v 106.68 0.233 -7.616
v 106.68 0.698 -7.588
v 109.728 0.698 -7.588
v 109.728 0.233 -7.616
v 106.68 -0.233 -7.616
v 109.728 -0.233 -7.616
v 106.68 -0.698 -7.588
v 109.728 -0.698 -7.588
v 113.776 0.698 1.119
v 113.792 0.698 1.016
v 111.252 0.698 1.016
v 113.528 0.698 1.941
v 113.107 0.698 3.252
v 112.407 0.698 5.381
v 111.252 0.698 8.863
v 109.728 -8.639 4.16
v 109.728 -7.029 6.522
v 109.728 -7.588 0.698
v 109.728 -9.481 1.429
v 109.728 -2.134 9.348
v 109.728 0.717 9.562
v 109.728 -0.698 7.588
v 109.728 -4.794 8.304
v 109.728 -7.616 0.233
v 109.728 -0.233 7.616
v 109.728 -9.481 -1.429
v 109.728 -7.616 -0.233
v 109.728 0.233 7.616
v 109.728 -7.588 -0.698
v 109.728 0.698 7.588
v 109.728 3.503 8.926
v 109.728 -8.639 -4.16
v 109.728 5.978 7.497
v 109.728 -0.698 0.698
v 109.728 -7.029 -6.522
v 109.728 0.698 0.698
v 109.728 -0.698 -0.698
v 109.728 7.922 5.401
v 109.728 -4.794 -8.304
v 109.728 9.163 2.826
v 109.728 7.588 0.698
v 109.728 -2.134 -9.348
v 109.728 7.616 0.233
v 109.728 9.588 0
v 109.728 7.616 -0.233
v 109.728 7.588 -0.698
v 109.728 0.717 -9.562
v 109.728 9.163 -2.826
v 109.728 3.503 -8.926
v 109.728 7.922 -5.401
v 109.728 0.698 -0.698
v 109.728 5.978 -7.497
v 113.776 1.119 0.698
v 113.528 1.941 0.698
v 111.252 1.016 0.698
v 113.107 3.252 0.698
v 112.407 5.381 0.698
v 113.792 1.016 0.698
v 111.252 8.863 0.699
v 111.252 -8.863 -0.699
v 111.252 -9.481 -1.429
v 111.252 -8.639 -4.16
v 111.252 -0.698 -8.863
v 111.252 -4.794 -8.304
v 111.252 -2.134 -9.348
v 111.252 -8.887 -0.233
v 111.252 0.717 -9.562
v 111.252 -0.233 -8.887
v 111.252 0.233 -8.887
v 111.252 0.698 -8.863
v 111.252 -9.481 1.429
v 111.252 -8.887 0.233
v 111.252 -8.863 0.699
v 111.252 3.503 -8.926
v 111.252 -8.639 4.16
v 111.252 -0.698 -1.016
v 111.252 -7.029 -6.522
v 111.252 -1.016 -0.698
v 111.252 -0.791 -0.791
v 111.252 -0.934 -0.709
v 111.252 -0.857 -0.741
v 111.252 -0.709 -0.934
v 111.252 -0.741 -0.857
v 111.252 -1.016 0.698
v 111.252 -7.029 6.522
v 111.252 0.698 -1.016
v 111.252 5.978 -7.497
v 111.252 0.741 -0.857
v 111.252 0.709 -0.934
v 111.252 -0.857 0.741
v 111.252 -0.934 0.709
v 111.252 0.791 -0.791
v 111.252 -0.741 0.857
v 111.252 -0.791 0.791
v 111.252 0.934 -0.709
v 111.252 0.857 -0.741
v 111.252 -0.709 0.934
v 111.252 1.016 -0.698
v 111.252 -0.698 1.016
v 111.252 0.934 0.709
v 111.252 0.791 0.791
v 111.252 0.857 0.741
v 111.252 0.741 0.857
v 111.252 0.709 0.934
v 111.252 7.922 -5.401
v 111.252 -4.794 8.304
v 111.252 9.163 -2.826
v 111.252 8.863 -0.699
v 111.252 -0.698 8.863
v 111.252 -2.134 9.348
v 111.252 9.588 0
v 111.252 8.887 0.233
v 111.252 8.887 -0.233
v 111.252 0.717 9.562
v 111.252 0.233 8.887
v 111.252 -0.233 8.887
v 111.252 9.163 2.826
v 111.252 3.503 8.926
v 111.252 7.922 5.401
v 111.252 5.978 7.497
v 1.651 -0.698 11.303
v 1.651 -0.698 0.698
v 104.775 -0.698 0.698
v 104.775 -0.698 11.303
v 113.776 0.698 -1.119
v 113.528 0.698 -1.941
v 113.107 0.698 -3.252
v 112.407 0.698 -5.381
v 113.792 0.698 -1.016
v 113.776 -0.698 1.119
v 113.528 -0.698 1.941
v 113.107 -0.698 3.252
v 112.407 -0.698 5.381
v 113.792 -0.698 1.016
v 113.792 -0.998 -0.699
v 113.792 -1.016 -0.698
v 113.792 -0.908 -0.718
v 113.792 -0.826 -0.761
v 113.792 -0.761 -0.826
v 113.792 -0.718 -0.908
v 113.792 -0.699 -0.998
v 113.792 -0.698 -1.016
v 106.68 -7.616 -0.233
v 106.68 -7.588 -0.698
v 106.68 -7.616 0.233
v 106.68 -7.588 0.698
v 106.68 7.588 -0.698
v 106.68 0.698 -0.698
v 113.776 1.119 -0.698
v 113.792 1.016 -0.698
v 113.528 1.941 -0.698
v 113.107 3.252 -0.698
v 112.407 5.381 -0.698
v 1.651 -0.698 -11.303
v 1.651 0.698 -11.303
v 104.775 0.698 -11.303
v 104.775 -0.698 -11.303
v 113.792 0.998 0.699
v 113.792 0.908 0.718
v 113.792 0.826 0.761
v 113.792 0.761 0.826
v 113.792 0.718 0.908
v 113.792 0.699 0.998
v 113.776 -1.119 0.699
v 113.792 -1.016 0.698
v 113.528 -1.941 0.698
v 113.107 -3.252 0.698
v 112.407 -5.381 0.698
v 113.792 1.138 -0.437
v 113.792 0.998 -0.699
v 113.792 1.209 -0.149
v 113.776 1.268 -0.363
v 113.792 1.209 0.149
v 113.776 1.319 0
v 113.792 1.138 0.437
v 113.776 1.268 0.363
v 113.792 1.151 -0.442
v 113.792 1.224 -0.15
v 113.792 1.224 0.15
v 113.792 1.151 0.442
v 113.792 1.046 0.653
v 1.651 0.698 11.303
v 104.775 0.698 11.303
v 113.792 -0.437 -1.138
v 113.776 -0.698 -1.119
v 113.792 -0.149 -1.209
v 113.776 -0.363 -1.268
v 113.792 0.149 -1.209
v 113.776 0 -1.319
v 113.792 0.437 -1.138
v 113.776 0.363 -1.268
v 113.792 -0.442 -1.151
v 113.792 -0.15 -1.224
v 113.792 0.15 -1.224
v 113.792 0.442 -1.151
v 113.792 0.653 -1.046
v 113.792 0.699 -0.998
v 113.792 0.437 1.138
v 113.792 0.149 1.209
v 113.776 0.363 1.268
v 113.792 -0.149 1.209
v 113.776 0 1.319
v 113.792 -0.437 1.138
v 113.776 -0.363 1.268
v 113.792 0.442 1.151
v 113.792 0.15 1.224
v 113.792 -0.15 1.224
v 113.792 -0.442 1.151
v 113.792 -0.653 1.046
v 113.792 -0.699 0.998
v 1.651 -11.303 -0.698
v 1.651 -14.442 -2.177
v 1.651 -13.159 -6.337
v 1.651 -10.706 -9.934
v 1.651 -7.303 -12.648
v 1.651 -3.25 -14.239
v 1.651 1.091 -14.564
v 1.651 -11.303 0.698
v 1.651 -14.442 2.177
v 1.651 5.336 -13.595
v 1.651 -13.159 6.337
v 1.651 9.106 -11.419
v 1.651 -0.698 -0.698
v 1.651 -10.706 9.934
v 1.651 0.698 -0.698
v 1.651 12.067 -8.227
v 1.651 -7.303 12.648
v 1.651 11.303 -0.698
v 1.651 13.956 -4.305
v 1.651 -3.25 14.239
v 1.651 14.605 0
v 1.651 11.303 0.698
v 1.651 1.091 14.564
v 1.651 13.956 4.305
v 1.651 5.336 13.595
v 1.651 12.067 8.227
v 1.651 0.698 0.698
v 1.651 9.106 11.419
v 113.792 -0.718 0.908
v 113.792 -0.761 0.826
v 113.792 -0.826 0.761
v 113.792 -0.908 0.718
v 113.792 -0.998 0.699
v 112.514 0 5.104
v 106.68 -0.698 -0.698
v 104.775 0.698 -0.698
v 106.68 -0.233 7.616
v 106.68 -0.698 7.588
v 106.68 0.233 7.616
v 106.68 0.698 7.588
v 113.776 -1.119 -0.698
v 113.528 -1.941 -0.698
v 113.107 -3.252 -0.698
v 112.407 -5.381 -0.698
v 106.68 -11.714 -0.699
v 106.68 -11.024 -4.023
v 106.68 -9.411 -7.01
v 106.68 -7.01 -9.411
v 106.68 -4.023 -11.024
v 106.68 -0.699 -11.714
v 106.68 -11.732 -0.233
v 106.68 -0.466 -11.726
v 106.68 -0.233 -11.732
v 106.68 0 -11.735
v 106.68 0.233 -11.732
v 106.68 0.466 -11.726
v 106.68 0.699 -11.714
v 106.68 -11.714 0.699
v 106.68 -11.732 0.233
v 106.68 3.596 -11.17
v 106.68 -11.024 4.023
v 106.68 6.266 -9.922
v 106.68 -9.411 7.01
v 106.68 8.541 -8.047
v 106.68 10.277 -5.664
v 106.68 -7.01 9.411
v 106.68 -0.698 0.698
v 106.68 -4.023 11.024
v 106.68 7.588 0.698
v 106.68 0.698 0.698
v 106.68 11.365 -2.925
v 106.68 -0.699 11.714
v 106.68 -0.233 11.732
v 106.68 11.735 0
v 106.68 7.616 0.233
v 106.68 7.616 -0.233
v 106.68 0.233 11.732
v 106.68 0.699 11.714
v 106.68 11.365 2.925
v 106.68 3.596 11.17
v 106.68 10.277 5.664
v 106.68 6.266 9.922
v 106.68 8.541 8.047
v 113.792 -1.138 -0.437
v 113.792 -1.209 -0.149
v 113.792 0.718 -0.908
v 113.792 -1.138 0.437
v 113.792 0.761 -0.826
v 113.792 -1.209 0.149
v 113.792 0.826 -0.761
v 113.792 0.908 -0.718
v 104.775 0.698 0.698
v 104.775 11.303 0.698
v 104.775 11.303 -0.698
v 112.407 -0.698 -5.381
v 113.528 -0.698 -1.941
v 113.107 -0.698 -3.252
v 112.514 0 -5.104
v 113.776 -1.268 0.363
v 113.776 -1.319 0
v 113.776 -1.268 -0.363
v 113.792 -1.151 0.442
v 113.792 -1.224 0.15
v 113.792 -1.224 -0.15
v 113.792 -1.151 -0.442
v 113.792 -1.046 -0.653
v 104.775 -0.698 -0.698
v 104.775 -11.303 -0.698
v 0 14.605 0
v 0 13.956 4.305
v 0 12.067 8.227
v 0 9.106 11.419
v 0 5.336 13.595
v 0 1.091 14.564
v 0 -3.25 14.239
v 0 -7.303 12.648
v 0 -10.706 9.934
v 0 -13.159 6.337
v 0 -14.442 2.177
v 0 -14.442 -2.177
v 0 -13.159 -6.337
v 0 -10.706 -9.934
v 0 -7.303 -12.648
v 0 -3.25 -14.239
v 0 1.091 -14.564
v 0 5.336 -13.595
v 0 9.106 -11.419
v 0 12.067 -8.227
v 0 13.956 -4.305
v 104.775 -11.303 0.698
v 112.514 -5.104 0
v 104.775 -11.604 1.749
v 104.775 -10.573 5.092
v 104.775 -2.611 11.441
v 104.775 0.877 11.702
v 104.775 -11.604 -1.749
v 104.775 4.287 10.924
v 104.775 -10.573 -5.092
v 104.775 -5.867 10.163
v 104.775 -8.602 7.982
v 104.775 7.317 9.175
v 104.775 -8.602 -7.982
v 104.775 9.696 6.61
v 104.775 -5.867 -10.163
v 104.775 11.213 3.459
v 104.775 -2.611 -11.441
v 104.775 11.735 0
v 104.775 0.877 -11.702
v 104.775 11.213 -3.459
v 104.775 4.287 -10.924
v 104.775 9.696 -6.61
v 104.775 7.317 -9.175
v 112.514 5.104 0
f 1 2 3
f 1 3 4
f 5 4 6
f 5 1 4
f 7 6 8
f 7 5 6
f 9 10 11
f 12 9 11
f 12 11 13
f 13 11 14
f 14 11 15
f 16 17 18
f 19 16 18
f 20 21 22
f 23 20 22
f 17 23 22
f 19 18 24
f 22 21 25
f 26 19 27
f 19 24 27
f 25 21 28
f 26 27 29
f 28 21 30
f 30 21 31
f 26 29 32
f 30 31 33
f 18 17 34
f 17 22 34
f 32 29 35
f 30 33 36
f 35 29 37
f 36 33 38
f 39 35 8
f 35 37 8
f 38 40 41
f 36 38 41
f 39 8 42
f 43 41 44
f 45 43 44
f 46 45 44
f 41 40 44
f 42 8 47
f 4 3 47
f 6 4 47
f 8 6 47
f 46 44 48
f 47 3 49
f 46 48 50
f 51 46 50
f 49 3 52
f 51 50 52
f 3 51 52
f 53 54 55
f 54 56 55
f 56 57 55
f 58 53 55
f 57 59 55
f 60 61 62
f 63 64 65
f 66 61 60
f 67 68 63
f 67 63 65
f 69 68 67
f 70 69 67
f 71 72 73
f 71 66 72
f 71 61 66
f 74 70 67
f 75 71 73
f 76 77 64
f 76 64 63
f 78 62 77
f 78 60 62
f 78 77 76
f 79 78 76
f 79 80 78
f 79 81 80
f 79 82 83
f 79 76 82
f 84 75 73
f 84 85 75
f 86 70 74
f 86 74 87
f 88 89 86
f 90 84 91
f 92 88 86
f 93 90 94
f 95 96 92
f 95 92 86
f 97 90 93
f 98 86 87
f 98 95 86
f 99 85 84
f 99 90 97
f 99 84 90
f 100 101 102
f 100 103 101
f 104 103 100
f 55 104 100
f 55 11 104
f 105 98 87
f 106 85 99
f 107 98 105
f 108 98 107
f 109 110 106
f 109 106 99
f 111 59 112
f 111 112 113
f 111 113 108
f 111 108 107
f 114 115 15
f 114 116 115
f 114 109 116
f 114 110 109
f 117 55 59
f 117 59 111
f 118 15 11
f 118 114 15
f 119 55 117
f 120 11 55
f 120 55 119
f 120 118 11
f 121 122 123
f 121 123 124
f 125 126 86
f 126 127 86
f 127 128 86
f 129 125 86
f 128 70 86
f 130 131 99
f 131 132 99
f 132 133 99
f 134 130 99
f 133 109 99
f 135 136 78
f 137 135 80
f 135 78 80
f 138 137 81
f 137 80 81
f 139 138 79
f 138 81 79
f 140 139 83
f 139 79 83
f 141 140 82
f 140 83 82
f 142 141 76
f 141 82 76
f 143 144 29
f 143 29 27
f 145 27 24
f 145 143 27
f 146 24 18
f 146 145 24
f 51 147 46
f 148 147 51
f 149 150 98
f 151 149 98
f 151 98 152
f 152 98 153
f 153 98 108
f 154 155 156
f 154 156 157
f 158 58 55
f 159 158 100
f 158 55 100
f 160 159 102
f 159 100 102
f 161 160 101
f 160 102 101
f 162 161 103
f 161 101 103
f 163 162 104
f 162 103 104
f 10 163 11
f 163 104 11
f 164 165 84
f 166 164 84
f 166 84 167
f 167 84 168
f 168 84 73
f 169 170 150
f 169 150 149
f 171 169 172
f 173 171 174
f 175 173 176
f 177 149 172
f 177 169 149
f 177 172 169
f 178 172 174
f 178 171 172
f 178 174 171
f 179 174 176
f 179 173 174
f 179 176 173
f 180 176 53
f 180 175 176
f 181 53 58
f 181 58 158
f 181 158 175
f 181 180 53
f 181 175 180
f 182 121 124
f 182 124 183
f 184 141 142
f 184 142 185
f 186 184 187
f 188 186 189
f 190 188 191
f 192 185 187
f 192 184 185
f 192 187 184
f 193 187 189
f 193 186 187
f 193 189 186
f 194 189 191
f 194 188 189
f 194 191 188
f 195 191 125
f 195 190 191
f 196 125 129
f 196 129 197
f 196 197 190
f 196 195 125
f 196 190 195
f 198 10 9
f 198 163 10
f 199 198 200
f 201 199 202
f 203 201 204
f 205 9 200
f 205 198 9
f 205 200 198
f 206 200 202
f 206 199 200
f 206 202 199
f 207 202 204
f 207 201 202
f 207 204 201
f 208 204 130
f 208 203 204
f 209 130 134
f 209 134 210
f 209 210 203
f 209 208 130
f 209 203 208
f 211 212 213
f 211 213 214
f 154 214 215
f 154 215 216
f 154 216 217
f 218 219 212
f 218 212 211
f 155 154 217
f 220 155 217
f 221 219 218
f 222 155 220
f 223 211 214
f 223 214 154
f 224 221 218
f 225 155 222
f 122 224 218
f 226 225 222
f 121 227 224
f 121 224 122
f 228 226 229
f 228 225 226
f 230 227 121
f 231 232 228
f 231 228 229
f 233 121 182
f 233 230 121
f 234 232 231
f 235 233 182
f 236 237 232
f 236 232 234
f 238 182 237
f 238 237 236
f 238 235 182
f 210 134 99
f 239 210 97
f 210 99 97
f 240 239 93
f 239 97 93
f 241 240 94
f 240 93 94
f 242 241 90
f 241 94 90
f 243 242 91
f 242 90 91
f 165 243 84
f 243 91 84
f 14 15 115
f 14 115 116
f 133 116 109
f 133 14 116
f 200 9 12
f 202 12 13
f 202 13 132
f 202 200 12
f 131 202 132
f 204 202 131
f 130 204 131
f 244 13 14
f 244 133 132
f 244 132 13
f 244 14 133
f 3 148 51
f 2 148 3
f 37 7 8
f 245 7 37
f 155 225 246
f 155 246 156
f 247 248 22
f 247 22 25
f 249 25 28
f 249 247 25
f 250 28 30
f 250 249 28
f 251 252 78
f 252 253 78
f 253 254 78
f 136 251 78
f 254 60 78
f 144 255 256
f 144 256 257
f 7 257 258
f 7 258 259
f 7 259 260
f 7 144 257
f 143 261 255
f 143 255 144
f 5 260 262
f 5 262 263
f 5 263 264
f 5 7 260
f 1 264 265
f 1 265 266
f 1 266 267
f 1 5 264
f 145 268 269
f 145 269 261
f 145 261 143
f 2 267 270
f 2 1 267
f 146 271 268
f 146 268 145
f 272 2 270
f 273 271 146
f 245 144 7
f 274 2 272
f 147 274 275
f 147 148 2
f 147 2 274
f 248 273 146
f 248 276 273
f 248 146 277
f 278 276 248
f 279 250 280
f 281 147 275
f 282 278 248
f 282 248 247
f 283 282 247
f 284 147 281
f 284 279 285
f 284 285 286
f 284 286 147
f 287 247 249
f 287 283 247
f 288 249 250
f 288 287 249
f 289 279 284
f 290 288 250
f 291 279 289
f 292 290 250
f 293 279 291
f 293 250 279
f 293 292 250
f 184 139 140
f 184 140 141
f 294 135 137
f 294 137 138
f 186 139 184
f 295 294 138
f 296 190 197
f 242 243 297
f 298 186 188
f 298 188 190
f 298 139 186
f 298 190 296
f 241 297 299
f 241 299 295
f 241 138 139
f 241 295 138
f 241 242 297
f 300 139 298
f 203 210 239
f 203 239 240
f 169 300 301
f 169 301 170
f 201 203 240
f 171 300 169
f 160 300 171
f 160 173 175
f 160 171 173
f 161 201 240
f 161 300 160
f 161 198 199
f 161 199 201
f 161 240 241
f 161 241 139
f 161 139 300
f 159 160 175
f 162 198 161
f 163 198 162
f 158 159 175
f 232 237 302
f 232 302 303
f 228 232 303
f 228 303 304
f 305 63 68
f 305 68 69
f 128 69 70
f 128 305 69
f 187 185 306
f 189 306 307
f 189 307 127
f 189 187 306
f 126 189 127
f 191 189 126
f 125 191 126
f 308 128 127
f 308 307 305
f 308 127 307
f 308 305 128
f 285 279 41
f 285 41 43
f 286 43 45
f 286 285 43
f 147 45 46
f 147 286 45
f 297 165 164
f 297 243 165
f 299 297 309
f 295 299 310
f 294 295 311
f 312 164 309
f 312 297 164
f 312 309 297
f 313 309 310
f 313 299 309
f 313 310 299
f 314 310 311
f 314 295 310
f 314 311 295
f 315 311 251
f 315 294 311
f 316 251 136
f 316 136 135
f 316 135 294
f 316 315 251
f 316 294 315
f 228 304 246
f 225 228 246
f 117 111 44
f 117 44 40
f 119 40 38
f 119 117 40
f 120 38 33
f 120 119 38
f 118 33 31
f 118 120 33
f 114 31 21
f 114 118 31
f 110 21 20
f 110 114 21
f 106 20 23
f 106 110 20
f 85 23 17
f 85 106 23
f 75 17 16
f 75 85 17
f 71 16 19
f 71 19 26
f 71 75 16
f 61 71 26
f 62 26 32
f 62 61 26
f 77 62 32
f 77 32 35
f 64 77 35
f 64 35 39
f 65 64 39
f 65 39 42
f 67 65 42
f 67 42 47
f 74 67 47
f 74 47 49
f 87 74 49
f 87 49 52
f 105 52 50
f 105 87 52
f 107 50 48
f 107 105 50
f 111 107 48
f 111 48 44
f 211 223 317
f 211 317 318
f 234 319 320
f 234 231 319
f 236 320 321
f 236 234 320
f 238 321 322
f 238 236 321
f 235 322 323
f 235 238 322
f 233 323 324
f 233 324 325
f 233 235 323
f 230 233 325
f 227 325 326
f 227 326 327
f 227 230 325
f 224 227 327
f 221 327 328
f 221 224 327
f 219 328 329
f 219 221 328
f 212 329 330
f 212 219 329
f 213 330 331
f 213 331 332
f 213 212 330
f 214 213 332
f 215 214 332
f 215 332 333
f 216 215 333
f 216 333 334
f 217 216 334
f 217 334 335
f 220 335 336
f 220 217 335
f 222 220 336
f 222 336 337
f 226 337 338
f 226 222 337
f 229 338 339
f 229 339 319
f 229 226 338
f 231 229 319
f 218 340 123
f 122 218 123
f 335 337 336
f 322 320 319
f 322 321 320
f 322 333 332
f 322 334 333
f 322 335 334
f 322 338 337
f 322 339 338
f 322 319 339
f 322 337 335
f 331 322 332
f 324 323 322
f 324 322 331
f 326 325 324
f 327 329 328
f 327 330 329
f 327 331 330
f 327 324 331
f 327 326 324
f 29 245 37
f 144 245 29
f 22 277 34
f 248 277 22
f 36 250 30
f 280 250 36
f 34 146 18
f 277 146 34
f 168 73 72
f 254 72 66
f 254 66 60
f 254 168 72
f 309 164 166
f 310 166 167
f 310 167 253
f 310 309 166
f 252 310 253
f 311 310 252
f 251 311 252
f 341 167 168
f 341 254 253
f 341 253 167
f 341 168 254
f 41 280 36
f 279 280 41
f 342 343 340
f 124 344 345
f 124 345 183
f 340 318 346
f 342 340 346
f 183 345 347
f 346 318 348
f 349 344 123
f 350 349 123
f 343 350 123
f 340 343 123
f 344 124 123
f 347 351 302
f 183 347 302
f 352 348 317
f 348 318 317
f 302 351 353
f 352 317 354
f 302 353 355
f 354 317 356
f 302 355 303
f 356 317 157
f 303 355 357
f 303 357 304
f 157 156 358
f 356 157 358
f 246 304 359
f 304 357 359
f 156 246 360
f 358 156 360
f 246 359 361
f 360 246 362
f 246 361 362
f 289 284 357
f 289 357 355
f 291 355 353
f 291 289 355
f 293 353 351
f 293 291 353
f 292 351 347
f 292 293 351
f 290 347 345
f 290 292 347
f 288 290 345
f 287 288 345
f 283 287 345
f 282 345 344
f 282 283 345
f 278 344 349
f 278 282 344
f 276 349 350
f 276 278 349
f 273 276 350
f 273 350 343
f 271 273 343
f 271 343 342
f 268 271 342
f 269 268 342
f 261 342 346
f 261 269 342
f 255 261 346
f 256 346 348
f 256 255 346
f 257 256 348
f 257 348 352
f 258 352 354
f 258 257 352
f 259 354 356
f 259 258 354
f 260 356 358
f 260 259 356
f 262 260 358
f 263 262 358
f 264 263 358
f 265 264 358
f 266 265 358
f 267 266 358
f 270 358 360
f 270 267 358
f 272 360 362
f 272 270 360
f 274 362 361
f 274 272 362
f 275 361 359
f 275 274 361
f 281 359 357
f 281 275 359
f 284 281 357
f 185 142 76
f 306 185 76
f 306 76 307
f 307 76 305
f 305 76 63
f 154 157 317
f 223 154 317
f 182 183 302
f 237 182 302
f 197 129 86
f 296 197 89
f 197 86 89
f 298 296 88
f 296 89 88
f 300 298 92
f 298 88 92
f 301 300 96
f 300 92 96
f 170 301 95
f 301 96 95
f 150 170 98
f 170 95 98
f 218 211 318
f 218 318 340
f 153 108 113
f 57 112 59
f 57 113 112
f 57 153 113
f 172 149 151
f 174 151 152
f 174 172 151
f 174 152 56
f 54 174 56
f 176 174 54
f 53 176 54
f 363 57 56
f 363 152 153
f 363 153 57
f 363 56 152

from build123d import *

# Parameters (mm, degrees)
SKETCH2_OUTSIDE_W                   = 55.422
SKETCH2_OUTSIDE_H                   = 55.422
CUT_EXTRUDE_PUSHER_SIDE_CROSS_DEPTH = 103.124
CUT_EXTRUDE_CROSS_2_DEPTH           = 3.048
SKETCH8_OUTSIDE_W                   = 55.422
SKETCH8_OUTSIDE_H                   = 55.422
CUT_EXTRUDE1_DEPTH                  = 3.54


with BuildPart() as part:
    # Sketch1 → Revolve: Main Body (revolve)
    with BuildSketch(Plane.XY):
        with BuildLine():
            Line((0, 0), (0, 14.605))
            Line((0, 14.605), (1.651, 14.605))
            Line((1.651, 14.605), (1.651, 11.7348))
            Line((1.651, 11.7348), (106.68, 11.7348))
            Line((106.68, 11.7348), (106.68, 9.5885))
            Line((106.68, 9.5885), (111.252, 9.5885))
            Line((111.252, 9.5885), (111.252, 8.89))
            Line((111.252, 8.89), (113.775706947, 1.318879159))
            ThreePointArc((113.775706947, 1.318879159), (113.787900268, 1.269334705), (113.792, 1.218476843))
            Line((113.792, 1.218476843), (113.792, 0))
            Line((113.792, 0), (0, 0))
        make_face()
    revolve(axis=Axis((-3.305576832, 0, 0), (1, 0, 0)))

    # Sketch2 outside → Cut-Extrude: Pusher Side Cross (cut)
    with BuildSketch(Plane(origin=(1.651, 0, 0), x_dir=(0, 0, -1), z_dir=(1, 0, 0))):
        Rectangle(SKETCH2_OUTSIDE_W, SKETCH2_OUTSIDE_H)
        Polygon((-0.6985, 11.303), (0.6985, 11.303), (0.6985, 0.6985), (11.303, 0.6985), (11.303, -0.6985), (0.6985, -0.6985), (0.6985, -11.303), (-0.6985, -11.303), (-0.6985, -0.6985), (-11.303, -0.6985), (-11.303, 0.6985), (-0.6985, 0.6985), align=None, mode=Mode.SUBTRACT)
    extrude(amount=CUT_EXTRUDE_PUSHER_SIDE_CROSS_DEPTH, mode=Mode.SUBTRACT)

    # Sketch3 → Cut-Extrude: Cross 2 (cut)
    with BuildSketch(Plane(origin=(106.68, 0, 0), x_dir=(0, 0, -1), z_dir=(1, 0, 0))):
        with BuildLine():
            Line((-11.713992863, 0.6985), (-9.563024103, 0.6985))
            ThreePointArc((-9.563024103, 0.6985), (-6.780093371, 6.780093371), (-0.6985, 9.563024103))
            Line((-0.6985, 9.563024103), (-0.6985, 11.713992863))
            ThreePointArc((-0.6985, 11.713992863), (-8.297756656, 8.297756656), (-11.713992863, 0.6985))
        make_face()
        with BuildLine():
            Line((0.6985, 11.713992863), (0.6985, 9.563024103))
            ThreePointArc((0.6985, 9.563024103), (6.780093371, 6.780093371), (9.563024103, 0.6985))
            Line((9.563024103, 0.6985), (11.713992863, 0.6985))
            ThreePointArc((11.713992863, 0.6985), (8.297756656, 8.297756656), (0.6985, 11.713992863))
        make_face()
        with BuildLine():
            ThreePointArc((9.563024103, -0.6985), (6.780093371, -6.780093371), (0.6985, -9.563024103))
            Line((0.6985, -9.563024103), (0.6985, -11.713992863))
            ThreePointArc((0.6985, -11.713992863), (8.297756656, -8.297756656), (11.713992863, -0.6985))
            Line((11.713992863, -0.6985), (9.563024103, -0.6985))
        make_face()
        with BuildLine():
            ThreePointArc((-0.6985, -9.563024103), (-6.780093371, -6.780093371), (-9.563024103, -0.6985))
            Line((-9.563024103, -0.6985), (-11.713992863, -0.6985))
            ThreePointArc((-11.713992863, -0.6985), (-8.297756656, -8.297756656), (-0.6985, -11.713992863))
            Line((-0.6985, -11.713992863), (-0.6985, -9.563024103))
        make_face()
        with BuildLine():
            Line((-9.563024103, 0.6985), (-7.58791788, 0.6985))
            Line((-7.58791788, 0.6985), (-0.6985, 0.6985))
            Line((-0.6985, 0.6985), (-0.6985, 7.58791788))
            Line((-0.6985, 7.58791788), (-0.6985, 9.563024103))
            ThreePointArc((-0.6985, 9.563024103), (-6.780093371, 6.780093371), (-9.563024103, 0.6985))
        make_face()
        with BuildLine():
            Line((0.6985, 9.563024103), (0.6985, 7.58791788))
            Line((0.6985, 7.58791788), (0.6985, 0.6985))
            Line((0.6985, 0.6985), (7.58791788, 0.6985))
            Line((7.58791788, 0.6985), (9.563024103, 0.6985))
            ThreePointArc((9.563024103, 0.6985), (6.780093371, 6.780093371), (0.6985, 9.563024103))
        make_face()
        with BuildLine():
            Line((0.6985, -7.58791788), (0.6985, -9.563024103))
            ThreePointArc((0.6985, -9.563024103), (6.780093371, -6.780093371), (9.563024103, -0.6985))
            Line((9.563024103, -0.6985), (7.58791788, -0.6985))
            Line((7.58791788, -0.6985), (0.6985, -0.6985))
            Line((0.6985, -0.6985), (0.6985, -7.58791788))
        make_face()
        with BuildLine():
            Line((-0.6985, -0.6985), (-7.58791788, -0.6985))
            Line((-7.58791788, -0.6985), (-9.563024103, -0.6985))
            ThreePointArc((-9.563024103, -0.6985), (-6.780093371, -6.780093371), (-0.6985, -9.563024103))
            Line((-0.6985, -9.563024103), (-0.6985, -7.58791788))
            Line((-0.6985, -7.58791788), (-0.6985, -0.6985))
        make_face()
        with BuildLine():
            Line((-0.6985, -7.58791788), (-0.6985, -9.563024103))
            ThreePointArc((-0.6985, -9.563024103), (0, -9.5885), (0.6985, -9.563024103))
            Line((0.6985, -9.563024103), (0.6985, -7.58791788))
            ThreePointArc((0.6985, -7.58791788), (0, -7.62), (-0.6985, -7.58791788))
        make_face()
        with BuildLine():
            Line((-0.6985, 9.563024103), (-0.6985, 7.58791788))
            ThreePointArc((-0.6985, 7.58791788), (0, 7.62), (0.6985, 7.58791788))
            Line((0.6985, 7.58791788), (0.6985, 9.563024103))
            ThreePointArc((0.6985, 9.563024103), (0, 9.5885), (-0.6985, 9.563024103))
        make_face()
        with BuildLine():
            Line((-0.6985, 11.713992863), (-0.6985, 9.563024103))
            ThreePointArc((-0.6985, 9.563024103), (0, 9.5885), (0.6985, 9.563024103))
            Line((0.6985, 9.563024103), (0.6985, 11.713992863))
            ThreePointArc((0.6985, 11.713992863), (0, 11.7348), (-0.6985, 11.713992863))
        make_face()
        with BuildLine():
            ThreePointArc((0.6985, -9.563024103), (0, -9.5885), (-0.6985, -9.563024103))
            Line((-0.6985, -9.563024103), (-0.6985, -11.713992863))
            ThreePointArc((-0.6985, -11.713992863), (0, -11.7348), (0.6985, -11.713992863))
            Line((0.6985, -11.713992863), (0.6985, -9.563024103))
        make_face()
        with BuildLine():
            Line((11.713992863, 0.6985), (9.563024103, 0.6985))
            ThreePointArc((9.563024103, 0.6985), (9.582128909, 0.349482214), (9.5885, 0))
            ThreePointArc((9.5885, 0), (9.582128909, -0.349482214), (9.563024103, -0.6985))
            Line((9.563024103, -0.6985), (11.713992863, -0.6985))
            ThreePointArc((11.713992863, -0.6985), (11.729597062, -0.349404918), (11.7348, 0))
            ThreePointArc((11.7348, 0), (11.729597062, 0.349404918), (11.713992863, 0.6985))
        make_face()
        with BuildLine():
            ThreePointArc((9.5885, 0), (9.582128909, 0.349482214), (9.563024103, 0.6985))
            Line((9.563024103, 0.6985), (7.58791788, 0.6985))
            ThreePointArc((7.58791788, 0.6985), (7.62, 0), (7.58791788, -0.6985))
            Line((7.58791788, -0.6985), (9.563024103, -0.6985))
            ThreePointArc((9.563024103, -0.6985), (9.582128909, -0.349482214), (9.5885, 0))
        make_face()
        with BuildLine():
            ThreePointArc((-7.58791788, -0.6985), (-7.62, 0), (-7.58791788, 0.6985))
            Line((-7.58791788, 0.6985), (-9.563024103, 0.6985))
            ThreePointArc((-9.563024103, 0.6985), (-9.5885, 0), (-9.563024103, -0.6985))
            Line((-9.563024103, -0.6985), (-7.58791788, -0.6985))
        make_face()
        with BuildLine():
            ThreePointArc((-9.563024103, -0.6985), (-9.5885, 0), (-9.563024103, 0.6985))
            Line((-9.563024103, 0.6985), (-11.713992863, 0.6985))
            ThreePointArc((-11.713992863, 0.6985), (-11.7348, 0), (-11.713992863, -0.6985))
            Line((-11.713992863, -0.6985), (-9.563024103, -0.6985))
        make_face()
    extrude(amount=CUT_EXTRUDE_CROSS_2_DEPTH, mode=Mode.SUBTRACT)

    # Sketch8 outside → Cut-Extrude1 (cut, through all)
    with BuildSketch(Plane(origin=(111.252, 0, 0), x_dir=(0, 0, -1), z_dir=(1, 0, 0))):
        Rectangle(SKETCH8_OUTSIDE_W, SKETCH8_OUTSIDE_H)
        with BuildLine():
            Line((-0.6985, -14.588287177), (0.6985, -14.588287177))
            Line((0.6985, -14.588287177), (0.6985, -1.016))
            ThreePointArc((0.6985, -1.016), (0.791493597, -0.791493597), (1.016, -0.6985))
            Line((1.016, -0.6985), (14.588287177, -0.6985))
            Line((14.588287177, -0.6985), (14.588287177, 0.6985))
            Line((14.588287177, 0.6985), (1.016, 0.6985))
            ThreePointArc((1.016, 0.6985), (0.791493597, 0.791493597), (0.6985, 1.016))
            Line((0.6985, 1.016), (0.6985, 14.588287177))
            Line((0.6985, 14.588287177), (-0.6985, 14.588287177))
            Line((-0.6985, 14.588287177), (-0.6985, 1.016))
            ThreePointArc((-0.6985, 1.016), (-0.791493597, 0.791493597), (-1.016, 0.6985))
            Line((-1.016, 0.6985), (-14.588287177, 0.6985))
            Line((-14.588287177, 0.6985), (-14.588287177, -0.6985))
            Line((-14.588287177, -0.6985), (-1.016, -0.6985))
            ThreePointArc((-1.016, -0.6985), (-0.791493597, -0.791493597), (-0.6985, -1.016))
            Line((-0.6985, -1.016), (-0.6985, -14.588287177))
        make_face(mode=Mode.SUBTRACT)
    extrude(amount=CUT_EXTRUDE1_DEPTH, mode=Mode.SUBTRACT)


solid = part.part
